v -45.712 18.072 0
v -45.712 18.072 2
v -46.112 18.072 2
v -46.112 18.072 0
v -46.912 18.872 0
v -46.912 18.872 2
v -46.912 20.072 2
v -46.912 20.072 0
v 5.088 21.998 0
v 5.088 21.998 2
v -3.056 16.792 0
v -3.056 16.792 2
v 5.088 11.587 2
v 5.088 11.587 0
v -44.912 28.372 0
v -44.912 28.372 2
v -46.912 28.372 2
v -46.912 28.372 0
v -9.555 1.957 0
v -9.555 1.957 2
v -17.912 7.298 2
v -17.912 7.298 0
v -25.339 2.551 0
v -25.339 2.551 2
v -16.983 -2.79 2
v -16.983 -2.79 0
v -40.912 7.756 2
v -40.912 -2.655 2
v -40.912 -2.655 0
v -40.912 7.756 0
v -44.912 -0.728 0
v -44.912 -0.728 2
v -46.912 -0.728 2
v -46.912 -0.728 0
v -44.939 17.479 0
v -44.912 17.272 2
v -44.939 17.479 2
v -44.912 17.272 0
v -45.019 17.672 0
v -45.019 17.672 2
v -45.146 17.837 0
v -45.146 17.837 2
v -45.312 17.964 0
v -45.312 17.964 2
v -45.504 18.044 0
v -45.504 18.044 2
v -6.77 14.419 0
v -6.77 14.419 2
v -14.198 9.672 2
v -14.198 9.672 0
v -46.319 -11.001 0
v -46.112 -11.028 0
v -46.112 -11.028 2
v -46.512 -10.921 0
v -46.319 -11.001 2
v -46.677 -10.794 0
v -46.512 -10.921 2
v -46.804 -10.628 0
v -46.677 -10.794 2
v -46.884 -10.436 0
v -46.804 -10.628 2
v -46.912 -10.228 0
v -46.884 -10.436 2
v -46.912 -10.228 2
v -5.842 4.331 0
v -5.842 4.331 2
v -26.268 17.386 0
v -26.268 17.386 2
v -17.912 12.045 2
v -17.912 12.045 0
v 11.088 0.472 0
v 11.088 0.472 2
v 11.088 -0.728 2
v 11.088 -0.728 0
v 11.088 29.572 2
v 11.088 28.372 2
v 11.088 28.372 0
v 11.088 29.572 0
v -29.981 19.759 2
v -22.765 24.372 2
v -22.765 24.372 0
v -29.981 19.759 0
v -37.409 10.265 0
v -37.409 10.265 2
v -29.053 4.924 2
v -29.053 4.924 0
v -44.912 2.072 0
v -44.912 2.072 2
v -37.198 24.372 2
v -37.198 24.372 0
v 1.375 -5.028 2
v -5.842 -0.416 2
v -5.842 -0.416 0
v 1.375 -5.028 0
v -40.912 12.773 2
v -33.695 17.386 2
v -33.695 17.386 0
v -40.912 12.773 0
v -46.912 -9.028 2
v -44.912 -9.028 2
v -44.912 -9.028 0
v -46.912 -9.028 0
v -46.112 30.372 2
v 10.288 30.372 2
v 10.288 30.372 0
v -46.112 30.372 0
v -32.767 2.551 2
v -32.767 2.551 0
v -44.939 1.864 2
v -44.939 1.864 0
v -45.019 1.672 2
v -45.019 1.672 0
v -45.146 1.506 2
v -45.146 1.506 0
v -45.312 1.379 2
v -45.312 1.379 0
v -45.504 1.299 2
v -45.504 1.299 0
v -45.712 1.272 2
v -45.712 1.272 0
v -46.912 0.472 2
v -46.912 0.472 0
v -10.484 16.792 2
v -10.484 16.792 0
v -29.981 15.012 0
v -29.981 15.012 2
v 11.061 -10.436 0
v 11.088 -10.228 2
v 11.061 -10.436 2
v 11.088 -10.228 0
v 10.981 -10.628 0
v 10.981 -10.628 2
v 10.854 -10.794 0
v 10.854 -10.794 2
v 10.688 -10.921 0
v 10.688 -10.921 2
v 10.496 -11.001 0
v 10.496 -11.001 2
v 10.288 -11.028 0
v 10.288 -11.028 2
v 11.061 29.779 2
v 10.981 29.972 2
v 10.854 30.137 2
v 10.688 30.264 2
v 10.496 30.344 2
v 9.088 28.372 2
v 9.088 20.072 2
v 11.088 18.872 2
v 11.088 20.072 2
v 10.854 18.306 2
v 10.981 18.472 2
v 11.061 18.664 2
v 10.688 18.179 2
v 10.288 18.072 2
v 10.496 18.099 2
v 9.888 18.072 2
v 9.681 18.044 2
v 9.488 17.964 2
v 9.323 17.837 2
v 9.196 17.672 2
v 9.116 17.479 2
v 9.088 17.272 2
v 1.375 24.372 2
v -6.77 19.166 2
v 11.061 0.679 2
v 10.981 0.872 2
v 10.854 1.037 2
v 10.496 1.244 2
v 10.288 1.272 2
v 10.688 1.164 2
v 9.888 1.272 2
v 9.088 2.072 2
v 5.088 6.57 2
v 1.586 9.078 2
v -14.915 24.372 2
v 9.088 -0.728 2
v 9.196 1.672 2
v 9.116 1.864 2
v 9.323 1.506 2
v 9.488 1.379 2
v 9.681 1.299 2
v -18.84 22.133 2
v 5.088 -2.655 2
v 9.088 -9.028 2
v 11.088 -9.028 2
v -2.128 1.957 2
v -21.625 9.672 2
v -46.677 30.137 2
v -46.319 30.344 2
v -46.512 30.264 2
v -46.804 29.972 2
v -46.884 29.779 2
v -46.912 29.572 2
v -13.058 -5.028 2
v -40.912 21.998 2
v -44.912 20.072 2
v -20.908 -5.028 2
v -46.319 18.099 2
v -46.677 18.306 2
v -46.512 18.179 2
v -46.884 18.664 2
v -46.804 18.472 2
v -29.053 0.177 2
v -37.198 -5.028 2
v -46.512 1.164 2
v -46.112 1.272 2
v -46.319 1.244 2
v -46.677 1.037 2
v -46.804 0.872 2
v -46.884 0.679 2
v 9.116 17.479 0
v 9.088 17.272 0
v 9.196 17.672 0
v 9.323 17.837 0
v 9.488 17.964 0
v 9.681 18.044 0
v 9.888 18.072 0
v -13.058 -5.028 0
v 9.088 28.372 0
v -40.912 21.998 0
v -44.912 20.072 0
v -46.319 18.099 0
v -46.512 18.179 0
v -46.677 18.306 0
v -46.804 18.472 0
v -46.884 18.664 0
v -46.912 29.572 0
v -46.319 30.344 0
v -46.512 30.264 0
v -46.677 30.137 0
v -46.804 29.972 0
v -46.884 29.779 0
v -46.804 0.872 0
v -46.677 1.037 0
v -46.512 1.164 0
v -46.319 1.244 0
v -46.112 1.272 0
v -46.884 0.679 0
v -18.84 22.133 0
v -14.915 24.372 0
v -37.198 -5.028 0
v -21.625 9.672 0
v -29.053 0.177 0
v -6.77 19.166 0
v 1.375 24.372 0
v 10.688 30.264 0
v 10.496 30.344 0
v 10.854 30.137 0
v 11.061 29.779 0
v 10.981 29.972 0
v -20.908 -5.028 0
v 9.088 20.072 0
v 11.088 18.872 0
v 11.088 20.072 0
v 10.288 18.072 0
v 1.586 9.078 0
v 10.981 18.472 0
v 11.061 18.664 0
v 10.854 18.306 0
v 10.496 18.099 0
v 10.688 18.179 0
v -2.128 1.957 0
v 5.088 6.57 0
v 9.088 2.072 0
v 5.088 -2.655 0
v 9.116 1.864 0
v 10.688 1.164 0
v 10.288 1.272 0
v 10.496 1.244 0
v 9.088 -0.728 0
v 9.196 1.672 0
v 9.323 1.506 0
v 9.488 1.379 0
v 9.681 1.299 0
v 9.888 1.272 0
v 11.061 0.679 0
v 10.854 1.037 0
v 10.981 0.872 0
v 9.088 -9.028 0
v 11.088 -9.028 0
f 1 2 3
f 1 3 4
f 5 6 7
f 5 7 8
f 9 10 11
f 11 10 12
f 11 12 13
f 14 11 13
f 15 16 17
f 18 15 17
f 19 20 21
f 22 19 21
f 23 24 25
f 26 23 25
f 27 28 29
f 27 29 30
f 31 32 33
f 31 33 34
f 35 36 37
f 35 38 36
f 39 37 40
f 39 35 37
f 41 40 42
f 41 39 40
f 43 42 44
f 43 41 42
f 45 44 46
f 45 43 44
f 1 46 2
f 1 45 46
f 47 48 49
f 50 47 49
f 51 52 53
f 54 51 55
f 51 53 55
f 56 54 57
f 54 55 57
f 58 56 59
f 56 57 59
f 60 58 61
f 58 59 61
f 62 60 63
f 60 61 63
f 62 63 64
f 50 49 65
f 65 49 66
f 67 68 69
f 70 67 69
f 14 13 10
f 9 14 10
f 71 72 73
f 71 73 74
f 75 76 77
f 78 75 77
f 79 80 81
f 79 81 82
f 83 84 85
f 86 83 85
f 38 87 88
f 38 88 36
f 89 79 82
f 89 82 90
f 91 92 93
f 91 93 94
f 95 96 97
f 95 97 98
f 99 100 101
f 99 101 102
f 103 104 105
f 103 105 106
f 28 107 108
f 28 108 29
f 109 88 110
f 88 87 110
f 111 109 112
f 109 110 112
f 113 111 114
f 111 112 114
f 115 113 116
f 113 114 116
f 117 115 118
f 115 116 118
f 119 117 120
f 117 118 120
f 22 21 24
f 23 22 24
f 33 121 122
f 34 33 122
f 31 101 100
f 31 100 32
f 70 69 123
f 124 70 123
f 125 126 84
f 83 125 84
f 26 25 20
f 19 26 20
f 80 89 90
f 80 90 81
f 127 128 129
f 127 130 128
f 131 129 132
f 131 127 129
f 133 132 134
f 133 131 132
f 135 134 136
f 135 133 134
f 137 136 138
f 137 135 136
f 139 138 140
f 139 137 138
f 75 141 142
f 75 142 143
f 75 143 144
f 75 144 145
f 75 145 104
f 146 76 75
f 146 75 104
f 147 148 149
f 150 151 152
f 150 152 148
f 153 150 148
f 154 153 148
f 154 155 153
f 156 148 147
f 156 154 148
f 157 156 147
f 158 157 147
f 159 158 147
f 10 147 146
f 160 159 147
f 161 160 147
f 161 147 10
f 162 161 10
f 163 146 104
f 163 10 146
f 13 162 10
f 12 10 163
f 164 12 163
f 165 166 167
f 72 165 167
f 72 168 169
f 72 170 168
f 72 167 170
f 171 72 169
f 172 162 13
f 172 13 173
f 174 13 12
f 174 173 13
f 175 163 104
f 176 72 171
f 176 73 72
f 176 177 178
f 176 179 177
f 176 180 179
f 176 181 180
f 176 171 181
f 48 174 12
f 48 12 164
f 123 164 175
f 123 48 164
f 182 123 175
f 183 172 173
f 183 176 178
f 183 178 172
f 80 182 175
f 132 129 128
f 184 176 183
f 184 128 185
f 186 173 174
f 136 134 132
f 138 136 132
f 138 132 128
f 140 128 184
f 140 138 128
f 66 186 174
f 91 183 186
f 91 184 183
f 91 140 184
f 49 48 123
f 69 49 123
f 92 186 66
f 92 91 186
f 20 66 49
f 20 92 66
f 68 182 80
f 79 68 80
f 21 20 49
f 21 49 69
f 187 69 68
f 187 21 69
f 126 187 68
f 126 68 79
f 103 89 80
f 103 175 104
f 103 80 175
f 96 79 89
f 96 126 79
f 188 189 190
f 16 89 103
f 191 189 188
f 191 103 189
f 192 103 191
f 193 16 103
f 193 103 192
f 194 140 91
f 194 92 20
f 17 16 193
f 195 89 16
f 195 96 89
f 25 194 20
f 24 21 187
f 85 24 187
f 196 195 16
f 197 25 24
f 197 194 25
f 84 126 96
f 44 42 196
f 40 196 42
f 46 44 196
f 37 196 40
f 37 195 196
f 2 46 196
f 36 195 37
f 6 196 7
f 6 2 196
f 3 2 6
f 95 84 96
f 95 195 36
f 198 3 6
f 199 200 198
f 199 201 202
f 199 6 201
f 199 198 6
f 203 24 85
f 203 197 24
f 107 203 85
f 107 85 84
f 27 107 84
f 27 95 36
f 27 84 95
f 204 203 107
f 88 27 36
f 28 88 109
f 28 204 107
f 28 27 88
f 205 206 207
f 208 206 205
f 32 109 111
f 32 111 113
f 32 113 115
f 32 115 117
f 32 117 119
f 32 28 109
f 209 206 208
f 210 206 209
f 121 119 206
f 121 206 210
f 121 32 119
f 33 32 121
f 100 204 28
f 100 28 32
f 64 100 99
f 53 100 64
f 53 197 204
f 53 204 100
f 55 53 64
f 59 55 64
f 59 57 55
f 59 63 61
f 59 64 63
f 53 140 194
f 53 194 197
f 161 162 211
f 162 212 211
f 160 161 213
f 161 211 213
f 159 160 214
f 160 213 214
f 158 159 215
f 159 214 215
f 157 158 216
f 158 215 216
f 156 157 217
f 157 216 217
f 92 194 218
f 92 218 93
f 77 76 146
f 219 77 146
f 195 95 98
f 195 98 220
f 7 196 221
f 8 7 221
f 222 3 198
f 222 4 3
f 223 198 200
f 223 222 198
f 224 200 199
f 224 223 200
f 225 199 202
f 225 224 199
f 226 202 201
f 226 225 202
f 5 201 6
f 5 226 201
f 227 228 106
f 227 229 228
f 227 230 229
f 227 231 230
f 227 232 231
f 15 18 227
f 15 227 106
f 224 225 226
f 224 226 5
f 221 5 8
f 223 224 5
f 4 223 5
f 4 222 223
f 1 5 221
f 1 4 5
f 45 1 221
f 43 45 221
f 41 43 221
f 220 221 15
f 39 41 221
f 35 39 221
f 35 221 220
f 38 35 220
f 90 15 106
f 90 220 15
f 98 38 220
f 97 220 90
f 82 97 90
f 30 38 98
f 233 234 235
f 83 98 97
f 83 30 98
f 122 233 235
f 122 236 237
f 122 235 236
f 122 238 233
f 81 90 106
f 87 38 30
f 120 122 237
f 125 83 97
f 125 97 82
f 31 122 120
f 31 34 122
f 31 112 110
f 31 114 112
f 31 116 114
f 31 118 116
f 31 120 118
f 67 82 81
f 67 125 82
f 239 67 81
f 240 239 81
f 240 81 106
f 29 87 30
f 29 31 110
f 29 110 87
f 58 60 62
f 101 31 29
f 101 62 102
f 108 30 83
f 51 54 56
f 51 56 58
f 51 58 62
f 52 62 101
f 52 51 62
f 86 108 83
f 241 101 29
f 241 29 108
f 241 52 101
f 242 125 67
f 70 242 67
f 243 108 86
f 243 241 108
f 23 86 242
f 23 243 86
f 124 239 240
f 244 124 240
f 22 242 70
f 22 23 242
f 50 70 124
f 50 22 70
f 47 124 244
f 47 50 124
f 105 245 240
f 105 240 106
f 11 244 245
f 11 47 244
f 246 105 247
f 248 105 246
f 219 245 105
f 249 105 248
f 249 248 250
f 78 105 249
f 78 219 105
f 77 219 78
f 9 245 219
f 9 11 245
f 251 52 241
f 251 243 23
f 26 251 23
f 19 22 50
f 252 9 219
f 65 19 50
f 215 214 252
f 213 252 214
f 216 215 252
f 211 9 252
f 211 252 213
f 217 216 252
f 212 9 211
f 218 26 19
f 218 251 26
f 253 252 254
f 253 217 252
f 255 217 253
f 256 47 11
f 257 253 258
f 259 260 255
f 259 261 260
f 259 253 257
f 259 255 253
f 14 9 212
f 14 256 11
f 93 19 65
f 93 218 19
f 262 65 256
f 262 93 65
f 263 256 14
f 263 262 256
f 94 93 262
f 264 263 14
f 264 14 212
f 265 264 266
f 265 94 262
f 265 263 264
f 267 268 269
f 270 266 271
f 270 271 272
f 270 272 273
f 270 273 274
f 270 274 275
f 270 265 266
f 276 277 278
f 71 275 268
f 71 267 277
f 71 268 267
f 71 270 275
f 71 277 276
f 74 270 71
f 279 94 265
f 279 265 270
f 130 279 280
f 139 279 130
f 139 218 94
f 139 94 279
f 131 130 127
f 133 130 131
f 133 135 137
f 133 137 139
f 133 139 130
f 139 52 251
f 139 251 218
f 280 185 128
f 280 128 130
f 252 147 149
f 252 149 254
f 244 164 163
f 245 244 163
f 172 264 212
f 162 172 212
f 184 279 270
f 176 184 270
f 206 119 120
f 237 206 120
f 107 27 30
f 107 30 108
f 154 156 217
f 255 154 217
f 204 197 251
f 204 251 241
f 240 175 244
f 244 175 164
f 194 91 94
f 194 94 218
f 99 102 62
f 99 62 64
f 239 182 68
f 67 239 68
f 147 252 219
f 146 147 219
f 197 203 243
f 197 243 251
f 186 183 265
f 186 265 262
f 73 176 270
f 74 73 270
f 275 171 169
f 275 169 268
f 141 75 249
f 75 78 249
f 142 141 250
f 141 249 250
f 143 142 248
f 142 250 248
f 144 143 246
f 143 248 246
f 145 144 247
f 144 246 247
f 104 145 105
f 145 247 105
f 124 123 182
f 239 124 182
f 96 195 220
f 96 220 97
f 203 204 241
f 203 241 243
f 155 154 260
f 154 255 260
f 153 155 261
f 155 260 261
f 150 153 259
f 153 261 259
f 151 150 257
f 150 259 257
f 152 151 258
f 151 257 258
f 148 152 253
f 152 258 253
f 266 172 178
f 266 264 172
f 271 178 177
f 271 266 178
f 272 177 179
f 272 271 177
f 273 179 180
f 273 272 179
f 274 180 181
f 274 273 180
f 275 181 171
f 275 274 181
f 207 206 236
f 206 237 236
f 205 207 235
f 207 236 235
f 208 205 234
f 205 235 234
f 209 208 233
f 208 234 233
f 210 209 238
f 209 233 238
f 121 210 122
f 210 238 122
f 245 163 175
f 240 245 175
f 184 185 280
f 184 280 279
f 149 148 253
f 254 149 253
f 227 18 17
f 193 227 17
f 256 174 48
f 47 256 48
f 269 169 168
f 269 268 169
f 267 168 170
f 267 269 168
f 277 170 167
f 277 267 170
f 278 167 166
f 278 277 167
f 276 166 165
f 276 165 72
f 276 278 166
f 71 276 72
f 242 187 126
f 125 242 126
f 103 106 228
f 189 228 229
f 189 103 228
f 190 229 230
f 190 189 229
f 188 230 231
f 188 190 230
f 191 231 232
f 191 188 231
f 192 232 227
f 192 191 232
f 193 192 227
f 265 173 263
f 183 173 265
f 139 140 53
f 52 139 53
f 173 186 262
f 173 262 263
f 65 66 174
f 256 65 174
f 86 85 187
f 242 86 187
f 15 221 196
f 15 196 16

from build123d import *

# Parameters (mm, degrees)
SKETCH1_W               = 54
SKETCH1_H               = 37.4
BOSS_EXTRUDE1_DEPTH     = 2
CUT_EXTRUDE1_DEPTH      = 54.160020758
BOSS_EXTRUDE2_DEPTH     = 2
SKETCH4_W               = 2
SKETCH4_H               = 2
BOSS_EXTRUDE3_DEPTH     = 2
FILLET3_R               = 0.8
MIRROR5_COPY_1_SKETCH_W = 2
MIRROR5_COPY_1_SKETCH_H = 2
MIRROR5_COPY_1_DEPTH    = 2
FILLET3_OF_MIRROR5_R    = 0.8


with BuildPart() as part:
    # Sketch1 → Boss-Extrude1 (new body)
    with BuildSketch(Plane.XY):
        with Locations((-17.911518112, 9.671523538)):
            Rectangle(SKETCH1_W, SKETCH1_H)
    extrude(amount=BOSS_EXTRUDE1_DEPTH)

    # Sketch2 → Cut-Extrude1 (cut, through all)
    with BuildSketch(Plane.XY.offset(2)):
        Polygon((-22.764922959, 24.371523538), (-29.981326879, 19.759300163), (-37.197730799, 24.371523538), align=None)
        Polygon((-33.695114192, 17.385705663), (-40.911518112, 12.773482289), (-40.911518112, 21.997929038), align=None)
        Polygon((-29.981326879, 15.012111163), (-37.408901505, 10.264922163), (-29.052880051, 4.924334538), (-21.625305425, 9.671523538), align=None)
        Polygon((-18.83996494, 22.132894663), (-26.267539566, 17.385705663), (-17.911518112, 12.045118038), (-10.483943486, 16.792307038), align=None)
        Polygon((1.374694575, 24.371523538), (-14.915006921, 24.371523538), (-6.770156173, 19.165901538), align=None)
        Polygon((-3.05636886, 16.792307038), (5.088481888, 11.586685039), (5.088481888, 21.997929038), align=None)
        Polygon((-6.770156173, 14.418712538), (-14.197730799, 9.671523538), (-5.841709344, 4.330935913), (1.585865282, 9.078124913), align=None)
        Polygon((-17.911518112, 7.297929038), (-25.339092738, 2.550740038), (-16.983071283, -2.789847587), (-9.555496657, 1.957341413), align=None)
        Polygon((-29.052880051, 0.177145538), (-20.908029303, -5.028476462), (-37.197730799, -5.028476462), align=None)
        Polygon((-40.911518112, 7.756362038), (-32.766667364, 2.550740038), (-40.911518112, -2.654881962), align=None)
        Polygon((-13.058113264, -5.028476462), (-5.841709344, -0.416253087), (1.374694575, -5.028476462), align=None)
        Polygon((-2.127922031, 1.957341413), (5.088481888, 6.569564788), (5.088481888, -2.654881962), align=None)
    extrude(amount=-CUT_EXTRUDE1_DEPTH, mode=Mode.SUBTRACT)

    # Sketch3 → Boss-Extrude2 (add)
    with BuildSketch(Plane.XZ.offset(9.028476462)):
        Polygon((9.088481888, 2), (11.088481888, 2), (11.088481888, 0), (9.088481888, 0), (-44.911518112, 0), (-46.911518112, 0), (-46.911518112, 2), (-44.911518112, 2), align=None)
    boss_extrude2 = extrude(amount=BOSS_EXTRUDE2_DEPTH)

    # Sketch4 → Boss-Extrude3 (add)
    with BuildSketch(Plane(origin=(9.088481888, 0, 0), x_dir=(0, 0, -1), z_dir=(1, 0, 0))):
        with Locations((-1, 0.271523538)):
            Rectangle(SKETCH4_W, SKETCH4_H)
    boss_extrude3 = extrude(amount=BOSS_EXTRUDE3_DEPTH)

    # Mirror2: Boss-Extrude3 across plane
    add(boss_extrude3.mirror(Plane.ZY.offset(17.911518112)))

    # Fillet3
    fillet3_edges = [part.edges().sort_by_distance(p)[0] for p in [
        (9.088481888, 1.271523538, 1),
        (11.088481888, 1.271523538, 1),
        (-46.911518112, 1.271523538, 1),
        (-44.911518112, 1.271523538, 1),
        (-46.911518112, -11.028476462, 1),
        (11.088481888, -11.028476462, 1),
    ]]
    fillet(fillet3_edges, radius=FILLET3_R)

    # Mirror5: Boss-Extrude2, Boss-Extrude3 across plane
    add(boss_extrude2.mirror(Plane(origin=(0, 9.671523538, 0), x_dir=(0, 0, 1), z_dir=(0, -1, 0))))
    add(boss_extrude3.mirror(Plane(origin=(0, 9.671523538, 0), x_dir=(0, 0, 1), z_dir=(0, -1, 0))))

    # Mirror5 copy 1 sketch → Mirror5 copy 1 (add)
    with BuildSketch(Plane(origin=(-44.911518112, 19.343047076, 0), x_dir=(0, 0, -1), z_dir=(-1, 0, 0))):
        with Locations((-1, 0.271523538)):
            Rectangle(MIRROR5_COPY_1_SKETCH_W, MIRROR5_COPY_1_SKETCH_H)
    extrude(amount=MIRROR5_COPY_1_DEPTH)

    # Fillet3 of Mirror5
    fillet3_of_mirror5_edges = [part.edges().sort_by_distance(p)[0] for p in [
        (9.088481888, 18.071523538, 1),
        (11.088481888, 18.071523538, 1),
        (-46.911518112, 18.071523538, 1),
        (-44.911518112, 18.071523538, 1),
        (-46.911518112, 30.371523538, 1),
        (11.088481888, 30.371523538, 1),
    ]]
    fillet(fillet3_of_mirror5_edges, radius=FILLET3_OF_MIRROR5_R)


solid = part.part
